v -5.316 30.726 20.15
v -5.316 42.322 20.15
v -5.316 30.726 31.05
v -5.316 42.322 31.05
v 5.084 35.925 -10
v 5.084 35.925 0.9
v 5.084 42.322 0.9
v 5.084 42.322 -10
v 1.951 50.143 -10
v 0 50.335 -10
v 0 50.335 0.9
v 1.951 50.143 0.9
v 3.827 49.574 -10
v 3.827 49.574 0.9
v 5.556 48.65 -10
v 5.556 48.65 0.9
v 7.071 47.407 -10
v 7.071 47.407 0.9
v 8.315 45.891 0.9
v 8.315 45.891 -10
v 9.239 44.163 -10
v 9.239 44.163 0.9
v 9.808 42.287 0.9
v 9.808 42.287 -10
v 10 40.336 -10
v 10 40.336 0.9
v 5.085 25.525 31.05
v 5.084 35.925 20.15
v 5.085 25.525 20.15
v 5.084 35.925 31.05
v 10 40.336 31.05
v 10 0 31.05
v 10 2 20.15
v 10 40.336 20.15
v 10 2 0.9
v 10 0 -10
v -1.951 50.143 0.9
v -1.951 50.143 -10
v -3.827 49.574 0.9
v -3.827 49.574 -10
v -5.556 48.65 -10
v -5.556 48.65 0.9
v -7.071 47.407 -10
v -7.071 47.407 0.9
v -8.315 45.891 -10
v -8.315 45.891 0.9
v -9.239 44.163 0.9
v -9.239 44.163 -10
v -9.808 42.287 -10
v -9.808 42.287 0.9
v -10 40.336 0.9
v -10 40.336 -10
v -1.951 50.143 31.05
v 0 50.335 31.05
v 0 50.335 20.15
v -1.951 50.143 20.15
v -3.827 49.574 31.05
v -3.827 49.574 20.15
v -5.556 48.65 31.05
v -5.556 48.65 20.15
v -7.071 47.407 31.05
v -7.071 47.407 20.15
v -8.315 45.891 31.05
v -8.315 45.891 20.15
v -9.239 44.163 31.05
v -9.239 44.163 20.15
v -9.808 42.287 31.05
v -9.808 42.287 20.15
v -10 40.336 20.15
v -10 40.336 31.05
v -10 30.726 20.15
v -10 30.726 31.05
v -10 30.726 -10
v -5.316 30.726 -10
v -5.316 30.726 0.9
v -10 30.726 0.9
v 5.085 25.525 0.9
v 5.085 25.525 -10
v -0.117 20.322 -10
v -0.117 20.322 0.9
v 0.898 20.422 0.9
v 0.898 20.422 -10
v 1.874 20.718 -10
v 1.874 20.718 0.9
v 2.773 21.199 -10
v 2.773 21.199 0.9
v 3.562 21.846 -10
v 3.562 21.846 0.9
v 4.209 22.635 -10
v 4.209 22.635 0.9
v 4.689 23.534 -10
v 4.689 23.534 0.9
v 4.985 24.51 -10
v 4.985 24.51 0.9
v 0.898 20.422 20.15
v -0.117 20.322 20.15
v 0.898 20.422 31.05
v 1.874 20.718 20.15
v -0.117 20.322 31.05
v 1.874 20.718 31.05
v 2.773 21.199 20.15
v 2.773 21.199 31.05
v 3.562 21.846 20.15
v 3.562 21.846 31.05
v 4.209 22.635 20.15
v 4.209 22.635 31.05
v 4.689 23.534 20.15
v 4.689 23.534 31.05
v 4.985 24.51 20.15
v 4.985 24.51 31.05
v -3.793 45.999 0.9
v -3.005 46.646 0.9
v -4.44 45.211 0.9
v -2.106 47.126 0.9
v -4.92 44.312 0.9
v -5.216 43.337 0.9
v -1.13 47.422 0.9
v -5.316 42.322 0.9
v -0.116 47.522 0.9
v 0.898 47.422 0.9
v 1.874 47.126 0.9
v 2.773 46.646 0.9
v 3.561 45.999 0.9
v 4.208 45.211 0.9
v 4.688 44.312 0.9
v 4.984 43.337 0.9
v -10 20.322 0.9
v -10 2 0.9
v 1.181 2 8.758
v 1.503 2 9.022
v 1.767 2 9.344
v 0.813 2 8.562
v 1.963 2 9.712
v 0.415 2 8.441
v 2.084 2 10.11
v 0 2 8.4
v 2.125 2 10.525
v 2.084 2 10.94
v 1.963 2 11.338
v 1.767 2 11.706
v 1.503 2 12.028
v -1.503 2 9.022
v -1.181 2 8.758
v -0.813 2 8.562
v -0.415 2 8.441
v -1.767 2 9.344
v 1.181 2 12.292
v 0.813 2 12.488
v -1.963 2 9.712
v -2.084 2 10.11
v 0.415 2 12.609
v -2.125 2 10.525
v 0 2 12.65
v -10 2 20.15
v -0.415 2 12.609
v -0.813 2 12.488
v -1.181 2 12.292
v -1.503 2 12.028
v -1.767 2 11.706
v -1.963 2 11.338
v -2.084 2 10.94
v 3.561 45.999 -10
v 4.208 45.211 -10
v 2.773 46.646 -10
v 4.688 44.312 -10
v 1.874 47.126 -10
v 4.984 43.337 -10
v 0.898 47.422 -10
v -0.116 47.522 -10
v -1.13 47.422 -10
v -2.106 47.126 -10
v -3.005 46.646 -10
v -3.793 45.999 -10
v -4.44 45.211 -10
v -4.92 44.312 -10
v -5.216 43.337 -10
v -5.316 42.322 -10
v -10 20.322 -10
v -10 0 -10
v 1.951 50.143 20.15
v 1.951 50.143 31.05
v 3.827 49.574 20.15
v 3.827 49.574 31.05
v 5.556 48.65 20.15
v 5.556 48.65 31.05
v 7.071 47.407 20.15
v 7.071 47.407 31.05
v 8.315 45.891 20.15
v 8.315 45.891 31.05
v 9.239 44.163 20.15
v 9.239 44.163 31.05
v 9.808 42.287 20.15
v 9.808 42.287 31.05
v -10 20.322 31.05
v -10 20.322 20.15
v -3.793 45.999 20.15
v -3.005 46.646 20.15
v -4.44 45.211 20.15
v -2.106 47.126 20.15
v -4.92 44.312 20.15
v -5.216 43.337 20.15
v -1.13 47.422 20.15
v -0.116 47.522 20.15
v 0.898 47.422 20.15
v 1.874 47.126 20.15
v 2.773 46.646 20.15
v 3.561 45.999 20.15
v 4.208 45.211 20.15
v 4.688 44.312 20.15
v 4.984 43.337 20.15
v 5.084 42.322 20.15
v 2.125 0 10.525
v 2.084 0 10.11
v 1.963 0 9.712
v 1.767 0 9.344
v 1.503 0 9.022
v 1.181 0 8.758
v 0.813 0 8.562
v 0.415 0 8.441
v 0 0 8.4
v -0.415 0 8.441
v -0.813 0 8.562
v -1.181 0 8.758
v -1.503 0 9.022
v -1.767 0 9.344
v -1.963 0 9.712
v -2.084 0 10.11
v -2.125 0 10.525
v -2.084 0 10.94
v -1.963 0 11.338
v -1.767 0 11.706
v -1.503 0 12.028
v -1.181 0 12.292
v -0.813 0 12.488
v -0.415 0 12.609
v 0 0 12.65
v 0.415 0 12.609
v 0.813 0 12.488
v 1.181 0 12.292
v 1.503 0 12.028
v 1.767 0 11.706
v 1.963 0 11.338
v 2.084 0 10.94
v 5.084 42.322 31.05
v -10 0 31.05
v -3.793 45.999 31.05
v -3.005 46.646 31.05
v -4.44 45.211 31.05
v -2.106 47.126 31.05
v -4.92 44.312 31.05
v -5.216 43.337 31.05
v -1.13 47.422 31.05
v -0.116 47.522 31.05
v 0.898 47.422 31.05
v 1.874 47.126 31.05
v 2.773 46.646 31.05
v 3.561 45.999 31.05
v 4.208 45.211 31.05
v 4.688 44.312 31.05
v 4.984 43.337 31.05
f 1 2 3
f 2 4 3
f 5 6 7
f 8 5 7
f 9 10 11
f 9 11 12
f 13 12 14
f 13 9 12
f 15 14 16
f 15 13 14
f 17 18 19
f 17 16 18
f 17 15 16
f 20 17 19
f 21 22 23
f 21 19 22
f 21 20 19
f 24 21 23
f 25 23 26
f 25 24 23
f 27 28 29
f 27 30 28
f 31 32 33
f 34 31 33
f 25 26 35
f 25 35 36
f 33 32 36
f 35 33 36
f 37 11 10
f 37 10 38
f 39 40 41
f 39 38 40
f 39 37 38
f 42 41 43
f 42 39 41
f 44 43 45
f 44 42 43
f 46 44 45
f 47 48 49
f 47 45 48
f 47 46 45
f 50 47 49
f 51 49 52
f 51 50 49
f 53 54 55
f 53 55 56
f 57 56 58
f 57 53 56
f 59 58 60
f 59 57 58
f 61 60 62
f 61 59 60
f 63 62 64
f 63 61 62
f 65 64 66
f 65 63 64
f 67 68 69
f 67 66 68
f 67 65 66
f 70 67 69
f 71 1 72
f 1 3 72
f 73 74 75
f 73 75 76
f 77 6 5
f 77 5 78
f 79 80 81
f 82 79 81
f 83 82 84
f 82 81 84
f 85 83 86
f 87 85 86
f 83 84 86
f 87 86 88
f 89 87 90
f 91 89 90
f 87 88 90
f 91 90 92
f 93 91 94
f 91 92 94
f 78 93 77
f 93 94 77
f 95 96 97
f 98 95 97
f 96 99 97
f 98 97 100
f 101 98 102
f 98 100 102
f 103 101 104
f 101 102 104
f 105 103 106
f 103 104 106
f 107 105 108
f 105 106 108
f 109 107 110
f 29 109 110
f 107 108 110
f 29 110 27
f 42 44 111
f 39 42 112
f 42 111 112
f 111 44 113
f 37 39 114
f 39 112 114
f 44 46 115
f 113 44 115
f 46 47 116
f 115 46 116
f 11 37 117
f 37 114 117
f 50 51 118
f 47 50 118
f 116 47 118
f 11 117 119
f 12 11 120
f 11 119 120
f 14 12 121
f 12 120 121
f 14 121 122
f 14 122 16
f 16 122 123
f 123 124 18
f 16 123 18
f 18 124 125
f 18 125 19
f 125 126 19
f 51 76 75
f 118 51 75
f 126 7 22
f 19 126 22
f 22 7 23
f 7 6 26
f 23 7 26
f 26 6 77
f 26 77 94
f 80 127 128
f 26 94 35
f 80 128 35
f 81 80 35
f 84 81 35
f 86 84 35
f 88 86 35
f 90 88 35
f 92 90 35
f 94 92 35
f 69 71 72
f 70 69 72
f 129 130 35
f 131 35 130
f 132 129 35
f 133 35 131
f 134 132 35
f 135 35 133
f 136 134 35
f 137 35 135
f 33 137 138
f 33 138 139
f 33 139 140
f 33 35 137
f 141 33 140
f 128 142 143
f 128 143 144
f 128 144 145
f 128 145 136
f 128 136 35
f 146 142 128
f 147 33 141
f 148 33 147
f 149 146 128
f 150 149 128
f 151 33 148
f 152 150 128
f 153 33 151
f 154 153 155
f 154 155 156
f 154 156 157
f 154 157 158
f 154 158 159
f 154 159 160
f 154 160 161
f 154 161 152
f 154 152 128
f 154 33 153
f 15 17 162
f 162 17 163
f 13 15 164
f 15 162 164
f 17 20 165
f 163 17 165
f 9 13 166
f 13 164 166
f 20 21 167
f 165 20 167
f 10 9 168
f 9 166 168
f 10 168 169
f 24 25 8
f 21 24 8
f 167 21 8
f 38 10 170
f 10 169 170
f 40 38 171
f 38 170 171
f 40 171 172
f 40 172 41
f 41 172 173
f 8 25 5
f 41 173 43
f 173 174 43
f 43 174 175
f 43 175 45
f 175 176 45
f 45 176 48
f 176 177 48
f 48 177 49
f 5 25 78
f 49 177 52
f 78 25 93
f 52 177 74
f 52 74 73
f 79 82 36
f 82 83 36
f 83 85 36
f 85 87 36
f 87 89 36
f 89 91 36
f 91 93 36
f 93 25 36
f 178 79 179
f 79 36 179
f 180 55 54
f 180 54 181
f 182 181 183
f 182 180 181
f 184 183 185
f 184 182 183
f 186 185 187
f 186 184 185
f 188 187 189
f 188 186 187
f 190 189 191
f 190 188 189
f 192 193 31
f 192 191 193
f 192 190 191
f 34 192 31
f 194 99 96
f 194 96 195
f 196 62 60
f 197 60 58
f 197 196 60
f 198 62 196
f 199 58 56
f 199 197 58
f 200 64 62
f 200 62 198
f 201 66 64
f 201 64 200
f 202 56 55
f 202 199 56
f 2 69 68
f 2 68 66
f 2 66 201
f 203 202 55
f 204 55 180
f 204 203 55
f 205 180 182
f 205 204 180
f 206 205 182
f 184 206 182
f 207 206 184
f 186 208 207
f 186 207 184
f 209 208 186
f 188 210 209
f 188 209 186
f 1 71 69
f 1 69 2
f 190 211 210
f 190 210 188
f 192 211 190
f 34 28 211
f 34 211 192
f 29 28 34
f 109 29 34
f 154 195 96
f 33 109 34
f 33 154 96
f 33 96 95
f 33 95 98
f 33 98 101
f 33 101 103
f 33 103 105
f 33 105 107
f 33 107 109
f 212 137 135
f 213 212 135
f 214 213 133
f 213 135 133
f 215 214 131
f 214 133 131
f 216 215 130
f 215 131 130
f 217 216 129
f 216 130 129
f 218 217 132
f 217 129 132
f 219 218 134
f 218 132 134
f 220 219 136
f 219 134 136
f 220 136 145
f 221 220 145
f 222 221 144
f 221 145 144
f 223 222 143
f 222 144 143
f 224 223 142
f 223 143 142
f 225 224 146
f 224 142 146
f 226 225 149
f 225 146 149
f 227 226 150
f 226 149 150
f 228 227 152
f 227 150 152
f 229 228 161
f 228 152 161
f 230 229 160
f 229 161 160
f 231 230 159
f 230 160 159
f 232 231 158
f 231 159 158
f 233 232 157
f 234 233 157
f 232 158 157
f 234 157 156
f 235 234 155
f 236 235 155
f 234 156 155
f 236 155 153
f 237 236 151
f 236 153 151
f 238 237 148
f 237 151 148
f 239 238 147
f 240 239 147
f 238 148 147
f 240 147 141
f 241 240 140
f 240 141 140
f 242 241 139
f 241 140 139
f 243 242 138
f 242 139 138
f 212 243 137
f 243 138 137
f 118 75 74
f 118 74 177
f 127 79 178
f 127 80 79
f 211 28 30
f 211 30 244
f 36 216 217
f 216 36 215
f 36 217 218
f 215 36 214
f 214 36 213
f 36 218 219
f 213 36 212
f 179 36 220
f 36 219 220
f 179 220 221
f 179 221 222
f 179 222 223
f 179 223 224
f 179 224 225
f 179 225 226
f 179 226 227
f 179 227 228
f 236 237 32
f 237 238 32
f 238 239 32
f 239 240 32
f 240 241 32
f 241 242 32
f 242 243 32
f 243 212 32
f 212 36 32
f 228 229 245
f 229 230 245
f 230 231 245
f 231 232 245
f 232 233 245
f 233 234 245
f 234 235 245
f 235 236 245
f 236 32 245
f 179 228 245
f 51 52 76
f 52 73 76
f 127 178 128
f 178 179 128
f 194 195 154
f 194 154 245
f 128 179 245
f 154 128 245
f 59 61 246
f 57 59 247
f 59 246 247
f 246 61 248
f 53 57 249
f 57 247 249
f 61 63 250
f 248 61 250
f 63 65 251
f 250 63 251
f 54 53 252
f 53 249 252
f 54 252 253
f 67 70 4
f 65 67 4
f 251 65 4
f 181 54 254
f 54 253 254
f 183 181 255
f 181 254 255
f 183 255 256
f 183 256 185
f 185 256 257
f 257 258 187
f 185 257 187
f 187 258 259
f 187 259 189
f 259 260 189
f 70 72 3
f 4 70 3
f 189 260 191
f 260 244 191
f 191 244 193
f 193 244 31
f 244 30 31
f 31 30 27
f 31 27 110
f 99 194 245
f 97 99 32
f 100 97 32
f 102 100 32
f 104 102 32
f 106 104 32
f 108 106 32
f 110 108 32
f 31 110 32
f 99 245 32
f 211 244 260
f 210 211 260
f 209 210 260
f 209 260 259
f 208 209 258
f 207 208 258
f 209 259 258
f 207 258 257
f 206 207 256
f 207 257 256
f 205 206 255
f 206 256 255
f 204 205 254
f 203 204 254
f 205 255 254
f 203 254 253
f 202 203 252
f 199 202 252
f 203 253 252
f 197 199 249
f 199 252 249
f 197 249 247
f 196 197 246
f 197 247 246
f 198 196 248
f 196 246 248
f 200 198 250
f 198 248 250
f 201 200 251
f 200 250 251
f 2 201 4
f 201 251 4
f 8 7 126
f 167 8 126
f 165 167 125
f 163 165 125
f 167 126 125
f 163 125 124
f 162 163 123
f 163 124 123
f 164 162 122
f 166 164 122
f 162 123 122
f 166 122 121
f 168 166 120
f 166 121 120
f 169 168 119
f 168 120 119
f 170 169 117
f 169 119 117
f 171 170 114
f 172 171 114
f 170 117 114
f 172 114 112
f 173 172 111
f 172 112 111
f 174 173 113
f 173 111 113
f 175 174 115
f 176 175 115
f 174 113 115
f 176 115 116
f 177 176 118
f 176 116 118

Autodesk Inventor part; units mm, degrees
ref_plane "YZ Plane" through (0, 0, 0) normal (1, 0, 0) x (0, 1, 0)
ref_plane "XZ Plane" through (0, 0, 0) normal (0, 1, 0) x (-1, 0, 0)
ref_plane "XY Plane" through (0, 0, 0) normal (0, 0, 1) x (1, 0, 0)
sketch "Sketch1" plane through (0, 0, 0) normal (0, 1, 0) x (-1, 0, 0)
  line L0 (10, 31.05) -> (-10, 31.05)
  line L1 (-10, 31.05) -> (-10, -10)
  line L2 (-10, -10) -> (10, -10)
  line L3 (10, -10) -> (10, 31.05)
  point P0 (0, 0)
  dimension "d0" = 20
  dimension "d1" = 41.05
extrude "Extrusion1" add sketch "Sketch1" along normal blind 2
sketch "Sketch2" plane through (0, 2, 0) normal (0, 1, 0) x (1, 0, 0)
  line L0 (-10, -31.05) -> (10, -31.05) projected
  line L1 (0, -31.05) -> (-6.35, -31.05)
  line L2 (-6.35, -20.15) -> (6.35, -20.15)
  line L3 (6.35, -31.05) -> (0, -31.05)
  line L4 (10, 10) -> (-10, 10) projected
  line L5 (-6.35, -0.9) -> (6.35, -0.9)
  line L6 (-6.35, 10) -> (6.35, 10)
  line L7 (-6.35, -31.05) -> (-10, -31.05)
  line L8 (-10, 10) -> (-10, -31.05) projected
  line L9 (-10, -20.15) -> (-6.35, -20.15)
  line L10 (6.35, -31.05) -> (10, -31.05)
  line L11 (10, -31.05) -> (10, 10) projected
  line L12 (10, -20.15) -> (6.35, -20.15)
  line L13 (6.35, -0.9) -> (10, -0.9)
  line L14 (10, 10) -> (6.35, 10)
  line L15 (10, -0.9) -> (10, 10)
  line L16 (10, -31.05) -> (10, -20.15)
  line L17 (-10, -31.05) -> (-10, -20.15)
  line L18 (-6.35, -0.9) -> (-10, -0.9)
  line L19 (-10, -0.9) -> (-10, 10)
  line L20 (-10, 10) -> (-6.35, 10)
  point P0 (0, 0)
  dimension "d4" = 6.35
  dimension "d5" = 10.9
  dimension "d6" = 12.7
  dimension "d7" = 10.9
extrude "Extrusion2" add sketch "Sketch2" along normal blind 48.3354 contours L8 L9 L2 L12 L11 L0 | L8 L4 L11 L13 L5 L18
sketch "Sketch9" plane through (-10, 0, 31.05) normal (0, 0, 1) x (1, 0, 0)
  arc A0 (15.084, 42.3223) -> (4.684, 42.3223) centre (9.884, 42.3223) ccw
  line L0 (15.084, 35.9247) -> (15.084, 42.3223)
  line L1 (4.684, 41.1247) -> (4.684, 42.3223)
  arc A1 (15.084, 42.3223) -> (4.684, 42.3223) centre (9.884, 42.3223) ccw
  line L2 (4.684, 42.3223) -> (4.684, 35.9247)
  line L3 (9.8827, 20.3222) -> (-0.0013, 20.3222)
  line L4 (-0.0013, 30.726) -> (-0.0013, 20.3222)
  line L5 (4.684, 35.9247) -> (4.684, 30.726)
  line L6 (15.084, 35.9247) -> (15.0853, 25.5254)
  arc A2 (15.084, 35.9247) -> (15.084, 35.9251) centre (9.884, 35.9243) ccw
  line L7 (4.684, 30.726) -> (-0.0013, 30.726)
  arc A3 (9.8827, 20.3222) -> (15.0853, 25.5254) centre (9.8827, 25.5248) ccw
  point P0 (10, 0)
fillet "Fillet4" radius 10 4 edges at (10, 50.3354, 25.6) (-10, 50.3354, 25.6) (-10, 50.3354, -4.55) (10, 50.3354, -4.55)
sketch "Sketch10" plane through (0, 2, 0) normal (0, 1, 0) x (1, 0, 0)
  line L0 (10, -31.05) -> (-10, -31.05) projected
  line L1 (-10, 10) -> (10, 10) projected
  line L2 (10, -20.15) -> (10, -0.9) projected
  line L3 (-10, -0.9) -> (-10, -20.15) projected
  line L4 (10, -10.525) -> (-10, -10.525)
  circle A0 centre (0, -10.525) radius 2.125
  point P0 (0, 0)
  dimension "d53" = 41.05
  dimension "d54" = 4.25
extrude "Extrusion10" cut sketch "Sketch10" against normal blind 2
extrude "Extrusion11" cut sketch "Sketch9" against normal through all
properties part number "6 Backet Adjustment"
